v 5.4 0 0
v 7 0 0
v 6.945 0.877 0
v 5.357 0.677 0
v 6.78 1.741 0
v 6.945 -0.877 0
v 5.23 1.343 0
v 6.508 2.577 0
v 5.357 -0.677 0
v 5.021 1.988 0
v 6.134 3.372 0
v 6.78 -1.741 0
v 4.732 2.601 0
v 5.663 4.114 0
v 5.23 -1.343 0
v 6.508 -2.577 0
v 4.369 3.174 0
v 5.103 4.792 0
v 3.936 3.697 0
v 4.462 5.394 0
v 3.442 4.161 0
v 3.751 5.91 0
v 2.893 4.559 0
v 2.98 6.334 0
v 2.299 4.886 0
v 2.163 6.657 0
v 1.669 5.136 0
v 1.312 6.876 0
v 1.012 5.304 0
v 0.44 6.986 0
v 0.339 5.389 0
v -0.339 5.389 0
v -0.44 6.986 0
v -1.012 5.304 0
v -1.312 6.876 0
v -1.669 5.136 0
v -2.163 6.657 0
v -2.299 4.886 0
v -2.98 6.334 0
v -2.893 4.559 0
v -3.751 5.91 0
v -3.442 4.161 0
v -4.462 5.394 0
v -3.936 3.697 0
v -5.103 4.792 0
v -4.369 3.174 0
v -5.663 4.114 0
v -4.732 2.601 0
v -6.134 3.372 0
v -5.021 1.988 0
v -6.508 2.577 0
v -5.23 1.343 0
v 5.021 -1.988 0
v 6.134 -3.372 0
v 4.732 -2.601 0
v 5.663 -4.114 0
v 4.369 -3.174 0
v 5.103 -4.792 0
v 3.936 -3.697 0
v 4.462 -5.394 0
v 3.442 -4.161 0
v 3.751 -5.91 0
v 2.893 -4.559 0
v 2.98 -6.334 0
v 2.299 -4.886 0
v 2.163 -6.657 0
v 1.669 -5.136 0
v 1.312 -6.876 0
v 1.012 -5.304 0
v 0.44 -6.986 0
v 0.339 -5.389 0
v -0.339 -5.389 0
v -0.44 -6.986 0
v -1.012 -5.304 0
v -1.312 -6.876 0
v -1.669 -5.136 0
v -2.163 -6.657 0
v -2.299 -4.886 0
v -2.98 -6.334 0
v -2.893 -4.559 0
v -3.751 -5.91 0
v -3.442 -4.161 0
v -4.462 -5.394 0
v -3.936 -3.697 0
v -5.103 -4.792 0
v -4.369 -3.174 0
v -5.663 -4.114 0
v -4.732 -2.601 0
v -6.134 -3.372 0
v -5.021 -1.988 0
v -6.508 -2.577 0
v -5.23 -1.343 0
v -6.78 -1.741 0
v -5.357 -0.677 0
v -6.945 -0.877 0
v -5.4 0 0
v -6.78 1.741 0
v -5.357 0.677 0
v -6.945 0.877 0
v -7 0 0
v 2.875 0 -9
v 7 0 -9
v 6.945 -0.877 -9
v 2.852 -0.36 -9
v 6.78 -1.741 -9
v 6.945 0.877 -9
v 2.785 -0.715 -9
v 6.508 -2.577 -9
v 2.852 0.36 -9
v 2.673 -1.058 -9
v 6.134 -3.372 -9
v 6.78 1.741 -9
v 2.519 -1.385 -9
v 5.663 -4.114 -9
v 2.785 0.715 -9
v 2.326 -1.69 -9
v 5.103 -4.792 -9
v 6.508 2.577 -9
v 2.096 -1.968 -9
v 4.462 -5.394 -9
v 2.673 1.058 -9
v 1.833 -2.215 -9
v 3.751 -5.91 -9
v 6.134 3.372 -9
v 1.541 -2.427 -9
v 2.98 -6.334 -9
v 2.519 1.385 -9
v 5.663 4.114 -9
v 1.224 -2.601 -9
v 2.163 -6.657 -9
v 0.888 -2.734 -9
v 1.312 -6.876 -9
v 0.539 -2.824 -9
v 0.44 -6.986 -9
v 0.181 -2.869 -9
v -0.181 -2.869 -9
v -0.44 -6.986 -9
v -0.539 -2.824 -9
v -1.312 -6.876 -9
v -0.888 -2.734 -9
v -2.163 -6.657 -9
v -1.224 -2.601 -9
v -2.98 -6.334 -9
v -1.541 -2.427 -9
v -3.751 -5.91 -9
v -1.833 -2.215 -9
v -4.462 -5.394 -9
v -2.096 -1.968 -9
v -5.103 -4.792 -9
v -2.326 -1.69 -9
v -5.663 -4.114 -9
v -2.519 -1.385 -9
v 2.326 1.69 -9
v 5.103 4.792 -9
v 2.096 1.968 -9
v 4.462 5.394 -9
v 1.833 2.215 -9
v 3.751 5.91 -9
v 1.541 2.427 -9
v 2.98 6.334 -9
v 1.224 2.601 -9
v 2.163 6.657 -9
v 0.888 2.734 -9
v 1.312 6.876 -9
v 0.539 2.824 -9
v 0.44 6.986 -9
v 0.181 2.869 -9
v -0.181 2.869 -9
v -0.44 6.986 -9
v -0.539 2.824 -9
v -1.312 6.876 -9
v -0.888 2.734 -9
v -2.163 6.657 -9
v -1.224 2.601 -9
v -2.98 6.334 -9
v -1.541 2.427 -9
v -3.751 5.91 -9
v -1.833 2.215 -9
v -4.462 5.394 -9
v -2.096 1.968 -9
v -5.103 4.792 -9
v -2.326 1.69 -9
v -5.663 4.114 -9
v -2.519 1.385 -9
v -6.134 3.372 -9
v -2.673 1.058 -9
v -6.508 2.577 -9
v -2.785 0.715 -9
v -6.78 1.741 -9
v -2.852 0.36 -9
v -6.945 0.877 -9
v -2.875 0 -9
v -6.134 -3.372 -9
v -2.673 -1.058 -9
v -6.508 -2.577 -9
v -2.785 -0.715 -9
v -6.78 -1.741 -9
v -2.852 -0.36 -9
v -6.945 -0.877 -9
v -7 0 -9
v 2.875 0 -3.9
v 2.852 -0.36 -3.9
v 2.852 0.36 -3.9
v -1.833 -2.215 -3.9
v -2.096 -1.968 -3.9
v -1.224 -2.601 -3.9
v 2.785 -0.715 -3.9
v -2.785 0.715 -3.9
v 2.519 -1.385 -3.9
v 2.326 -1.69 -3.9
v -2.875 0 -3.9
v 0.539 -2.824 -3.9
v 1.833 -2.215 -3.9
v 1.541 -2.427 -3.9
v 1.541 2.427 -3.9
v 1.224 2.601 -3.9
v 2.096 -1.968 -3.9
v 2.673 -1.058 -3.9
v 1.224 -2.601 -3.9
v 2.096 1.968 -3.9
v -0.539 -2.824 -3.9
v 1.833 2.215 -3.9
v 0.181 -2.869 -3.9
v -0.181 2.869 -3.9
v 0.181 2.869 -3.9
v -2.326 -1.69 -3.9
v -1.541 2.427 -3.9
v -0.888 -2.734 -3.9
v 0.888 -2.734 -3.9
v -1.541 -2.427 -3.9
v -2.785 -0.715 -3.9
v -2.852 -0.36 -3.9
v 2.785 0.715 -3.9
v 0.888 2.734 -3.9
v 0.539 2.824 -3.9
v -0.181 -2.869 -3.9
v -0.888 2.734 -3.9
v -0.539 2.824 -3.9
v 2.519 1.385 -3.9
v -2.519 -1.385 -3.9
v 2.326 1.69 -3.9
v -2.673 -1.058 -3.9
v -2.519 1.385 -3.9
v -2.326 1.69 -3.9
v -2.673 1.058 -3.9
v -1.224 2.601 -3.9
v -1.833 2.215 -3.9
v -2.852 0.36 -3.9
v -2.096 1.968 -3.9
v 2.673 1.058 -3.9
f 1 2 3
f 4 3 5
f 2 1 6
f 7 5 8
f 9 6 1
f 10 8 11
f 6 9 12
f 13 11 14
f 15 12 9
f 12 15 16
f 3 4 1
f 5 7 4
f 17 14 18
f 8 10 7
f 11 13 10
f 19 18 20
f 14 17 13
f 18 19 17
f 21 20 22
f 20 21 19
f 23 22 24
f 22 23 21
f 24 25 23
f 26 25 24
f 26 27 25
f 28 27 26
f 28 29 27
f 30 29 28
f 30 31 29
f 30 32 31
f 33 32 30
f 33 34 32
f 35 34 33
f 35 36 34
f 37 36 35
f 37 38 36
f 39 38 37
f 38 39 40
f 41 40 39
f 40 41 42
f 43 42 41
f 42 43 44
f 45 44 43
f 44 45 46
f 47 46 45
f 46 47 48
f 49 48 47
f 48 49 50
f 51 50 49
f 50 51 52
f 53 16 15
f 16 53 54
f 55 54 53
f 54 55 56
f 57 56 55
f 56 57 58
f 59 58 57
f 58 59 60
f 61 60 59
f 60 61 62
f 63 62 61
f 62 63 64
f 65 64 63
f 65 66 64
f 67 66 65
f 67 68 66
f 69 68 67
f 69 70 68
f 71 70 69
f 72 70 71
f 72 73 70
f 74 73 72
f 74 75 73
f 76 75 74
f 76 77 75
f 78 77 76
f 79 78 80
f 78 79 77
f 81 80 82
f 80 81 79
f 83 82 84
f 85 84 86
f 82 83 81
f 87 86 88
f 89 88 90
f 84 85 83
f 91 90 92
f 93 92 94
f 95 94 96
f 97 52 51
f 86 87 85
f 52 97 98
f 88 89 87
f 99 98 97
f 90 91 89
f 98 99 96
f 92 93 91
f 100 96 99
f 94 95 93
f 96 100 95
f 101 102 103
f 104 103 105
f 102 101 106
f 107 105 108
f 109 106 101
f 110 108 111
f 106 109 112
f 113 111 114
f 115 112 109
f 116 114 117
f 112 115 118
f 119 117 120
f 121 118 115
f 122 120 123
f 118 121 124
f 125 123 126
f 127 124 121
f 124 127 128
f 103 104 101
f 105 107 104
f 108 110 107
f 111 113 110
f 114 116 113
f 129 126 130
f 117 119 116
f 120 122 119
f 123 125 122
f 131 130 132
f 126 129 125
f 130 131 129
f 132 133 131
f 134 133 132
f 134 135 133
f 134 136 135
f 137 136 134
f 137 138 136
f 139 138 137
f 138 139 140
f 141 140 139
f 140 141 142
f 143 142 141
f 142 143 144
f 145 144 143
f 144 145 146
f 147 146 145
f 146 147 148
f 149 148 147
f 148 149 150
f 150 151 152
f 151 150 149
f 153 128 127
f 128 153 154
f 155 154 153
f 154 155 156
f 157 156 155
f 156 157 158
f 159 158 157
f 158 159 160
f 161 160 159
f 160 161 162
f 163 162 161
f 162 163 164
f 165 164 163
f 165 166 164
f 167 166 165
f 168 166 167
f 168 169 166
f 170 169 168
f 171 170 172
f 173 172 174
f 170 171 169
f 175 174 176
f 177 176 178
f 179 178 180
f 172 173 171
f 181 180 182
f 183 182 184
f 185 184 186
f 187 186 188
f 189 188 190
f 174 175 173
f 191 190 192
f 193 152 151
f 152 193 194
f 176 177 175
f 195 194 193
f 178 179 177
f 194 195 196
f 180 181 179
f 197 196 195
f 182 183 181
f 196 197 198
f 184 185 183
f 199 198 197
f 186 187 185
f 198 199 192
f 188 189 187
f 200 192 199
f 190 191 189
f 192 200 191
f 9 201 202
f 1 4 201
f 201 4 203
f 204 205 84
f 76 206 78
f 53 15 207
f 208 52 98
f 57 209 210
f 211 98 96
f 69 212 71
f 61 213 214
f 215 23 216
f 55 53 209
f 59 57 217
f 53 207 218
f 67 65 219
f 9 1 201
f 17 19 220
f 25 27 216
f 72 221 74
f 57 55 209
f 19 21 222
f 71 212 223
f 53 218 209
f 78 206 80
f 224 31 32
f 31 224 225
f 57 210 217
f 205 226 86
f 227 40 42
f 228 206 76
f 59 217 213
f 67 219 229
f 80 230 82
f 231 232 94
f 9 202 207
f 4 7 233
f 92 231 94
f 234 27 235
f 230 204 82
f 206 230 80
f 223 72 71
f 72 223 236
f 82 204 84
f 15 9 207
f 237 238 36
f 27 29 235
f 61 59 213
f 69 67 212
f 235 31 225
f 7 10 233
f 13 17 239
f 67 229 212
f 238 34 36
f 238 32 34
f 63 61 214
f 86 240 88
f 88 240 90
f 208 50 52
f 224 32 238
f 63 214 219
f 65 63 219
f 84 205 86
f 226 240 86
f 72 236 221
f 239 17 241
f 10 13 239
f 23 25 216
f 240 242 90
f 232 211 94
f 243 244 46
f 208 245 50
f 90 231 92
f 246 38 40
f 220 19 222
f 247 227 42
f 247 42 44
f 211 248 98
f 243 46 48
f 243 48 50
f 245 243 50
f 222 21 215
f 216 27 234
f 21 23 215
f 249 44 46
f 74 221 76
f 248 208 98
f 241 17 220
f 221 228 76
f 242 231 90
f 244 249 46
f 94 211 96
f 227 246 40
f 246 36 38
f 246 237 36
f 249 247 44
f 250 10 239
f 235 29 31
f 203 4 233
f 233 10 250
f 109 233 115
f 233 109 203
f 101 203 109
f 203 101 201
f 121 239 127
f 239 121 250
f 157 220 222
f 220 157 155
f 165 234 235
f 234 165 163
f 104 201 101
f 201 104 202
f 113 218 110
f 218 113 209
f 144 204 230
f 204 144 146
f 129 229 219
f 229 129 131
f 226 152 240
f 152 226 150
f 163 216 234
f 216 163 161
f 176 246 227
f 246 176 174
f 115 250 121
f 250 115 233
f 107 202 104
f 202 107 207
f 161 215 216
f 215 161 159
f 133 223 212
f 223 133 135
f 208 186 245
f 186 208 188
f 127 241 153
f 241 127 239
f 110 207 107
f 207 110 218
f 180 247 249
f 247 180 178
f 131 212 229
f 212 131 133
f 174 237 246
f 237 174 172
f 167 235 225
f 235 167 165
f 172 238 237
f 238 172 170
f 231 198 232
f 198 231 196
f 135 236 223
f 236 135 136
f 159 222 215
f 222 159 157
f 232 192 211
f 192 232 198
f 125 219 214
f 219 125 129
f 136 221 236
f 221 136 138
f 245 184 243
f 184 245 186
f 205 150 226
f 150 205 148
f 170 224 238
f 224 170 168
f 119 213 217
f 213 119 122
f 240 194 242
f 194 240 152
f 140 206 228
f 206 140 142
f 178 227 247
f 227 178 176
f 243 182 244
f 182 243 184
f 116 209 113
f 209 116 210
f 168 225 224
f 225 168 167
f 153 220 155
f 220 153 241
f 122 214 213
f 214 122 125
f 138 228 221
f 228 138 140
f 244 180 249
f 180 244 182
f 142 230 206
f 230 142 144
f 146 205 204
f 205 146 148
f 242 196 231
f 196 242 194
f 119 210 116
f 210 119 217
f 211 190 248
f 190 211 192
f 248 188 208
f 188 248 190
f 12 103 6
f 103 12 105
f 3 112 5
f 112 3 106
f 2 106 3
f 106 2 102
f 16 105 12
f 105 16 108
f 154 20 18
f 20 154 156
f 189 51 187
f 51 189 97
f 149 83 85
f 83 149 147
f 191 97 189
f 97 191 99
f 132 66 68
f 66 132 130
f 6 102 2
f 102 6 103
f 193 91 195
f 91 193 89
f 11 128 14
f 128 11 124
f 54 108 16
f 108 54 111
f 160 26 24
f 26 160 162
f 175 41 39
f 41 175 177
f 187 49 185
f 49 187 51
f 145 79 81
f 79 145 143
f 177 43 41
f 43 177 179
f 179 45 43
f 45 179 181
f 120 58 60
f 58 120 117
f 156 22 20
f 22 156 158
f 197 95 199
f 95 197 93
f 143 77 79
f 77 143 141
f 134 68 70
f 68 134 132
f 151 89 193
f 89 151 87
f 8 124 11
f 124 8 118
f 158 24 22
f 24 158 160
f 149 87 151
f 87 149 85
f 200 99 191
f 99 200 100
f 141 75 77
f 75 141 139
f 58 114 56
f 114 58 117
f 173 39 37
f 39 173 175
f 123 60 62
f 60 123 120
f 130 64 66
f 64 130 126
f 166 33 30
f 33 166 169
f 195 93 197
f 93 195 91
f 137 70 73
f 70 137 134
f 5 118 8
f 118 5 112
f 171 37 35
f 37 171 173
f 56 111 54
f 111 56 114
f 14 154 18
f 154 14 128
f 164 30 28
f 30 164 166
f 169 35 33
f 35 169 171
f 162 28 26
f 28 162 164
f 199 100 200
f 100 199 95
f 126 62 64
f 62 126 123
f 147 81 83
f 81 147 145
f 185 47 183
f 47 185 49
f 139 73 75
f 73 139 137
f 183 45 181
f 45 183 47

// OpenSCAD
$fn = 50;


difference() {
	union() {
		translate(v = [0, 0, -9.0000000000]) {
			cylinder(h = 9, r = 7.0000000000);
		}
		cylinder(h = 0, r = 16.0000000000);
	}
	union() {
		translate(v = [0, 0, 0]) {
			rotate(a = [0, 0, 0]) {
				difference() {
					union() {
						#translate(v = [0, 0, -9.0000000000]) {
							cylinder(h = 9, r = 2.6000000000);
						}
						#translate(v = [0, 0, -3.9000000000]) {
							cylinder(h = 3.9000000000, r = 7.0000000000, r1 = 2.8750000000, r2 = 5.4000000000);
						}
						#translate(v = [0, 0, -9.0000000000]) {
							cylinder(h = 9, r = 2.8750000000);
						}
						#translate(v = [0, 0, -9.0000000000]) {
							cylinder(h = 9, r = 2.6000000000);
						}
					}
					union();
				}
			}
		}
	}
}
